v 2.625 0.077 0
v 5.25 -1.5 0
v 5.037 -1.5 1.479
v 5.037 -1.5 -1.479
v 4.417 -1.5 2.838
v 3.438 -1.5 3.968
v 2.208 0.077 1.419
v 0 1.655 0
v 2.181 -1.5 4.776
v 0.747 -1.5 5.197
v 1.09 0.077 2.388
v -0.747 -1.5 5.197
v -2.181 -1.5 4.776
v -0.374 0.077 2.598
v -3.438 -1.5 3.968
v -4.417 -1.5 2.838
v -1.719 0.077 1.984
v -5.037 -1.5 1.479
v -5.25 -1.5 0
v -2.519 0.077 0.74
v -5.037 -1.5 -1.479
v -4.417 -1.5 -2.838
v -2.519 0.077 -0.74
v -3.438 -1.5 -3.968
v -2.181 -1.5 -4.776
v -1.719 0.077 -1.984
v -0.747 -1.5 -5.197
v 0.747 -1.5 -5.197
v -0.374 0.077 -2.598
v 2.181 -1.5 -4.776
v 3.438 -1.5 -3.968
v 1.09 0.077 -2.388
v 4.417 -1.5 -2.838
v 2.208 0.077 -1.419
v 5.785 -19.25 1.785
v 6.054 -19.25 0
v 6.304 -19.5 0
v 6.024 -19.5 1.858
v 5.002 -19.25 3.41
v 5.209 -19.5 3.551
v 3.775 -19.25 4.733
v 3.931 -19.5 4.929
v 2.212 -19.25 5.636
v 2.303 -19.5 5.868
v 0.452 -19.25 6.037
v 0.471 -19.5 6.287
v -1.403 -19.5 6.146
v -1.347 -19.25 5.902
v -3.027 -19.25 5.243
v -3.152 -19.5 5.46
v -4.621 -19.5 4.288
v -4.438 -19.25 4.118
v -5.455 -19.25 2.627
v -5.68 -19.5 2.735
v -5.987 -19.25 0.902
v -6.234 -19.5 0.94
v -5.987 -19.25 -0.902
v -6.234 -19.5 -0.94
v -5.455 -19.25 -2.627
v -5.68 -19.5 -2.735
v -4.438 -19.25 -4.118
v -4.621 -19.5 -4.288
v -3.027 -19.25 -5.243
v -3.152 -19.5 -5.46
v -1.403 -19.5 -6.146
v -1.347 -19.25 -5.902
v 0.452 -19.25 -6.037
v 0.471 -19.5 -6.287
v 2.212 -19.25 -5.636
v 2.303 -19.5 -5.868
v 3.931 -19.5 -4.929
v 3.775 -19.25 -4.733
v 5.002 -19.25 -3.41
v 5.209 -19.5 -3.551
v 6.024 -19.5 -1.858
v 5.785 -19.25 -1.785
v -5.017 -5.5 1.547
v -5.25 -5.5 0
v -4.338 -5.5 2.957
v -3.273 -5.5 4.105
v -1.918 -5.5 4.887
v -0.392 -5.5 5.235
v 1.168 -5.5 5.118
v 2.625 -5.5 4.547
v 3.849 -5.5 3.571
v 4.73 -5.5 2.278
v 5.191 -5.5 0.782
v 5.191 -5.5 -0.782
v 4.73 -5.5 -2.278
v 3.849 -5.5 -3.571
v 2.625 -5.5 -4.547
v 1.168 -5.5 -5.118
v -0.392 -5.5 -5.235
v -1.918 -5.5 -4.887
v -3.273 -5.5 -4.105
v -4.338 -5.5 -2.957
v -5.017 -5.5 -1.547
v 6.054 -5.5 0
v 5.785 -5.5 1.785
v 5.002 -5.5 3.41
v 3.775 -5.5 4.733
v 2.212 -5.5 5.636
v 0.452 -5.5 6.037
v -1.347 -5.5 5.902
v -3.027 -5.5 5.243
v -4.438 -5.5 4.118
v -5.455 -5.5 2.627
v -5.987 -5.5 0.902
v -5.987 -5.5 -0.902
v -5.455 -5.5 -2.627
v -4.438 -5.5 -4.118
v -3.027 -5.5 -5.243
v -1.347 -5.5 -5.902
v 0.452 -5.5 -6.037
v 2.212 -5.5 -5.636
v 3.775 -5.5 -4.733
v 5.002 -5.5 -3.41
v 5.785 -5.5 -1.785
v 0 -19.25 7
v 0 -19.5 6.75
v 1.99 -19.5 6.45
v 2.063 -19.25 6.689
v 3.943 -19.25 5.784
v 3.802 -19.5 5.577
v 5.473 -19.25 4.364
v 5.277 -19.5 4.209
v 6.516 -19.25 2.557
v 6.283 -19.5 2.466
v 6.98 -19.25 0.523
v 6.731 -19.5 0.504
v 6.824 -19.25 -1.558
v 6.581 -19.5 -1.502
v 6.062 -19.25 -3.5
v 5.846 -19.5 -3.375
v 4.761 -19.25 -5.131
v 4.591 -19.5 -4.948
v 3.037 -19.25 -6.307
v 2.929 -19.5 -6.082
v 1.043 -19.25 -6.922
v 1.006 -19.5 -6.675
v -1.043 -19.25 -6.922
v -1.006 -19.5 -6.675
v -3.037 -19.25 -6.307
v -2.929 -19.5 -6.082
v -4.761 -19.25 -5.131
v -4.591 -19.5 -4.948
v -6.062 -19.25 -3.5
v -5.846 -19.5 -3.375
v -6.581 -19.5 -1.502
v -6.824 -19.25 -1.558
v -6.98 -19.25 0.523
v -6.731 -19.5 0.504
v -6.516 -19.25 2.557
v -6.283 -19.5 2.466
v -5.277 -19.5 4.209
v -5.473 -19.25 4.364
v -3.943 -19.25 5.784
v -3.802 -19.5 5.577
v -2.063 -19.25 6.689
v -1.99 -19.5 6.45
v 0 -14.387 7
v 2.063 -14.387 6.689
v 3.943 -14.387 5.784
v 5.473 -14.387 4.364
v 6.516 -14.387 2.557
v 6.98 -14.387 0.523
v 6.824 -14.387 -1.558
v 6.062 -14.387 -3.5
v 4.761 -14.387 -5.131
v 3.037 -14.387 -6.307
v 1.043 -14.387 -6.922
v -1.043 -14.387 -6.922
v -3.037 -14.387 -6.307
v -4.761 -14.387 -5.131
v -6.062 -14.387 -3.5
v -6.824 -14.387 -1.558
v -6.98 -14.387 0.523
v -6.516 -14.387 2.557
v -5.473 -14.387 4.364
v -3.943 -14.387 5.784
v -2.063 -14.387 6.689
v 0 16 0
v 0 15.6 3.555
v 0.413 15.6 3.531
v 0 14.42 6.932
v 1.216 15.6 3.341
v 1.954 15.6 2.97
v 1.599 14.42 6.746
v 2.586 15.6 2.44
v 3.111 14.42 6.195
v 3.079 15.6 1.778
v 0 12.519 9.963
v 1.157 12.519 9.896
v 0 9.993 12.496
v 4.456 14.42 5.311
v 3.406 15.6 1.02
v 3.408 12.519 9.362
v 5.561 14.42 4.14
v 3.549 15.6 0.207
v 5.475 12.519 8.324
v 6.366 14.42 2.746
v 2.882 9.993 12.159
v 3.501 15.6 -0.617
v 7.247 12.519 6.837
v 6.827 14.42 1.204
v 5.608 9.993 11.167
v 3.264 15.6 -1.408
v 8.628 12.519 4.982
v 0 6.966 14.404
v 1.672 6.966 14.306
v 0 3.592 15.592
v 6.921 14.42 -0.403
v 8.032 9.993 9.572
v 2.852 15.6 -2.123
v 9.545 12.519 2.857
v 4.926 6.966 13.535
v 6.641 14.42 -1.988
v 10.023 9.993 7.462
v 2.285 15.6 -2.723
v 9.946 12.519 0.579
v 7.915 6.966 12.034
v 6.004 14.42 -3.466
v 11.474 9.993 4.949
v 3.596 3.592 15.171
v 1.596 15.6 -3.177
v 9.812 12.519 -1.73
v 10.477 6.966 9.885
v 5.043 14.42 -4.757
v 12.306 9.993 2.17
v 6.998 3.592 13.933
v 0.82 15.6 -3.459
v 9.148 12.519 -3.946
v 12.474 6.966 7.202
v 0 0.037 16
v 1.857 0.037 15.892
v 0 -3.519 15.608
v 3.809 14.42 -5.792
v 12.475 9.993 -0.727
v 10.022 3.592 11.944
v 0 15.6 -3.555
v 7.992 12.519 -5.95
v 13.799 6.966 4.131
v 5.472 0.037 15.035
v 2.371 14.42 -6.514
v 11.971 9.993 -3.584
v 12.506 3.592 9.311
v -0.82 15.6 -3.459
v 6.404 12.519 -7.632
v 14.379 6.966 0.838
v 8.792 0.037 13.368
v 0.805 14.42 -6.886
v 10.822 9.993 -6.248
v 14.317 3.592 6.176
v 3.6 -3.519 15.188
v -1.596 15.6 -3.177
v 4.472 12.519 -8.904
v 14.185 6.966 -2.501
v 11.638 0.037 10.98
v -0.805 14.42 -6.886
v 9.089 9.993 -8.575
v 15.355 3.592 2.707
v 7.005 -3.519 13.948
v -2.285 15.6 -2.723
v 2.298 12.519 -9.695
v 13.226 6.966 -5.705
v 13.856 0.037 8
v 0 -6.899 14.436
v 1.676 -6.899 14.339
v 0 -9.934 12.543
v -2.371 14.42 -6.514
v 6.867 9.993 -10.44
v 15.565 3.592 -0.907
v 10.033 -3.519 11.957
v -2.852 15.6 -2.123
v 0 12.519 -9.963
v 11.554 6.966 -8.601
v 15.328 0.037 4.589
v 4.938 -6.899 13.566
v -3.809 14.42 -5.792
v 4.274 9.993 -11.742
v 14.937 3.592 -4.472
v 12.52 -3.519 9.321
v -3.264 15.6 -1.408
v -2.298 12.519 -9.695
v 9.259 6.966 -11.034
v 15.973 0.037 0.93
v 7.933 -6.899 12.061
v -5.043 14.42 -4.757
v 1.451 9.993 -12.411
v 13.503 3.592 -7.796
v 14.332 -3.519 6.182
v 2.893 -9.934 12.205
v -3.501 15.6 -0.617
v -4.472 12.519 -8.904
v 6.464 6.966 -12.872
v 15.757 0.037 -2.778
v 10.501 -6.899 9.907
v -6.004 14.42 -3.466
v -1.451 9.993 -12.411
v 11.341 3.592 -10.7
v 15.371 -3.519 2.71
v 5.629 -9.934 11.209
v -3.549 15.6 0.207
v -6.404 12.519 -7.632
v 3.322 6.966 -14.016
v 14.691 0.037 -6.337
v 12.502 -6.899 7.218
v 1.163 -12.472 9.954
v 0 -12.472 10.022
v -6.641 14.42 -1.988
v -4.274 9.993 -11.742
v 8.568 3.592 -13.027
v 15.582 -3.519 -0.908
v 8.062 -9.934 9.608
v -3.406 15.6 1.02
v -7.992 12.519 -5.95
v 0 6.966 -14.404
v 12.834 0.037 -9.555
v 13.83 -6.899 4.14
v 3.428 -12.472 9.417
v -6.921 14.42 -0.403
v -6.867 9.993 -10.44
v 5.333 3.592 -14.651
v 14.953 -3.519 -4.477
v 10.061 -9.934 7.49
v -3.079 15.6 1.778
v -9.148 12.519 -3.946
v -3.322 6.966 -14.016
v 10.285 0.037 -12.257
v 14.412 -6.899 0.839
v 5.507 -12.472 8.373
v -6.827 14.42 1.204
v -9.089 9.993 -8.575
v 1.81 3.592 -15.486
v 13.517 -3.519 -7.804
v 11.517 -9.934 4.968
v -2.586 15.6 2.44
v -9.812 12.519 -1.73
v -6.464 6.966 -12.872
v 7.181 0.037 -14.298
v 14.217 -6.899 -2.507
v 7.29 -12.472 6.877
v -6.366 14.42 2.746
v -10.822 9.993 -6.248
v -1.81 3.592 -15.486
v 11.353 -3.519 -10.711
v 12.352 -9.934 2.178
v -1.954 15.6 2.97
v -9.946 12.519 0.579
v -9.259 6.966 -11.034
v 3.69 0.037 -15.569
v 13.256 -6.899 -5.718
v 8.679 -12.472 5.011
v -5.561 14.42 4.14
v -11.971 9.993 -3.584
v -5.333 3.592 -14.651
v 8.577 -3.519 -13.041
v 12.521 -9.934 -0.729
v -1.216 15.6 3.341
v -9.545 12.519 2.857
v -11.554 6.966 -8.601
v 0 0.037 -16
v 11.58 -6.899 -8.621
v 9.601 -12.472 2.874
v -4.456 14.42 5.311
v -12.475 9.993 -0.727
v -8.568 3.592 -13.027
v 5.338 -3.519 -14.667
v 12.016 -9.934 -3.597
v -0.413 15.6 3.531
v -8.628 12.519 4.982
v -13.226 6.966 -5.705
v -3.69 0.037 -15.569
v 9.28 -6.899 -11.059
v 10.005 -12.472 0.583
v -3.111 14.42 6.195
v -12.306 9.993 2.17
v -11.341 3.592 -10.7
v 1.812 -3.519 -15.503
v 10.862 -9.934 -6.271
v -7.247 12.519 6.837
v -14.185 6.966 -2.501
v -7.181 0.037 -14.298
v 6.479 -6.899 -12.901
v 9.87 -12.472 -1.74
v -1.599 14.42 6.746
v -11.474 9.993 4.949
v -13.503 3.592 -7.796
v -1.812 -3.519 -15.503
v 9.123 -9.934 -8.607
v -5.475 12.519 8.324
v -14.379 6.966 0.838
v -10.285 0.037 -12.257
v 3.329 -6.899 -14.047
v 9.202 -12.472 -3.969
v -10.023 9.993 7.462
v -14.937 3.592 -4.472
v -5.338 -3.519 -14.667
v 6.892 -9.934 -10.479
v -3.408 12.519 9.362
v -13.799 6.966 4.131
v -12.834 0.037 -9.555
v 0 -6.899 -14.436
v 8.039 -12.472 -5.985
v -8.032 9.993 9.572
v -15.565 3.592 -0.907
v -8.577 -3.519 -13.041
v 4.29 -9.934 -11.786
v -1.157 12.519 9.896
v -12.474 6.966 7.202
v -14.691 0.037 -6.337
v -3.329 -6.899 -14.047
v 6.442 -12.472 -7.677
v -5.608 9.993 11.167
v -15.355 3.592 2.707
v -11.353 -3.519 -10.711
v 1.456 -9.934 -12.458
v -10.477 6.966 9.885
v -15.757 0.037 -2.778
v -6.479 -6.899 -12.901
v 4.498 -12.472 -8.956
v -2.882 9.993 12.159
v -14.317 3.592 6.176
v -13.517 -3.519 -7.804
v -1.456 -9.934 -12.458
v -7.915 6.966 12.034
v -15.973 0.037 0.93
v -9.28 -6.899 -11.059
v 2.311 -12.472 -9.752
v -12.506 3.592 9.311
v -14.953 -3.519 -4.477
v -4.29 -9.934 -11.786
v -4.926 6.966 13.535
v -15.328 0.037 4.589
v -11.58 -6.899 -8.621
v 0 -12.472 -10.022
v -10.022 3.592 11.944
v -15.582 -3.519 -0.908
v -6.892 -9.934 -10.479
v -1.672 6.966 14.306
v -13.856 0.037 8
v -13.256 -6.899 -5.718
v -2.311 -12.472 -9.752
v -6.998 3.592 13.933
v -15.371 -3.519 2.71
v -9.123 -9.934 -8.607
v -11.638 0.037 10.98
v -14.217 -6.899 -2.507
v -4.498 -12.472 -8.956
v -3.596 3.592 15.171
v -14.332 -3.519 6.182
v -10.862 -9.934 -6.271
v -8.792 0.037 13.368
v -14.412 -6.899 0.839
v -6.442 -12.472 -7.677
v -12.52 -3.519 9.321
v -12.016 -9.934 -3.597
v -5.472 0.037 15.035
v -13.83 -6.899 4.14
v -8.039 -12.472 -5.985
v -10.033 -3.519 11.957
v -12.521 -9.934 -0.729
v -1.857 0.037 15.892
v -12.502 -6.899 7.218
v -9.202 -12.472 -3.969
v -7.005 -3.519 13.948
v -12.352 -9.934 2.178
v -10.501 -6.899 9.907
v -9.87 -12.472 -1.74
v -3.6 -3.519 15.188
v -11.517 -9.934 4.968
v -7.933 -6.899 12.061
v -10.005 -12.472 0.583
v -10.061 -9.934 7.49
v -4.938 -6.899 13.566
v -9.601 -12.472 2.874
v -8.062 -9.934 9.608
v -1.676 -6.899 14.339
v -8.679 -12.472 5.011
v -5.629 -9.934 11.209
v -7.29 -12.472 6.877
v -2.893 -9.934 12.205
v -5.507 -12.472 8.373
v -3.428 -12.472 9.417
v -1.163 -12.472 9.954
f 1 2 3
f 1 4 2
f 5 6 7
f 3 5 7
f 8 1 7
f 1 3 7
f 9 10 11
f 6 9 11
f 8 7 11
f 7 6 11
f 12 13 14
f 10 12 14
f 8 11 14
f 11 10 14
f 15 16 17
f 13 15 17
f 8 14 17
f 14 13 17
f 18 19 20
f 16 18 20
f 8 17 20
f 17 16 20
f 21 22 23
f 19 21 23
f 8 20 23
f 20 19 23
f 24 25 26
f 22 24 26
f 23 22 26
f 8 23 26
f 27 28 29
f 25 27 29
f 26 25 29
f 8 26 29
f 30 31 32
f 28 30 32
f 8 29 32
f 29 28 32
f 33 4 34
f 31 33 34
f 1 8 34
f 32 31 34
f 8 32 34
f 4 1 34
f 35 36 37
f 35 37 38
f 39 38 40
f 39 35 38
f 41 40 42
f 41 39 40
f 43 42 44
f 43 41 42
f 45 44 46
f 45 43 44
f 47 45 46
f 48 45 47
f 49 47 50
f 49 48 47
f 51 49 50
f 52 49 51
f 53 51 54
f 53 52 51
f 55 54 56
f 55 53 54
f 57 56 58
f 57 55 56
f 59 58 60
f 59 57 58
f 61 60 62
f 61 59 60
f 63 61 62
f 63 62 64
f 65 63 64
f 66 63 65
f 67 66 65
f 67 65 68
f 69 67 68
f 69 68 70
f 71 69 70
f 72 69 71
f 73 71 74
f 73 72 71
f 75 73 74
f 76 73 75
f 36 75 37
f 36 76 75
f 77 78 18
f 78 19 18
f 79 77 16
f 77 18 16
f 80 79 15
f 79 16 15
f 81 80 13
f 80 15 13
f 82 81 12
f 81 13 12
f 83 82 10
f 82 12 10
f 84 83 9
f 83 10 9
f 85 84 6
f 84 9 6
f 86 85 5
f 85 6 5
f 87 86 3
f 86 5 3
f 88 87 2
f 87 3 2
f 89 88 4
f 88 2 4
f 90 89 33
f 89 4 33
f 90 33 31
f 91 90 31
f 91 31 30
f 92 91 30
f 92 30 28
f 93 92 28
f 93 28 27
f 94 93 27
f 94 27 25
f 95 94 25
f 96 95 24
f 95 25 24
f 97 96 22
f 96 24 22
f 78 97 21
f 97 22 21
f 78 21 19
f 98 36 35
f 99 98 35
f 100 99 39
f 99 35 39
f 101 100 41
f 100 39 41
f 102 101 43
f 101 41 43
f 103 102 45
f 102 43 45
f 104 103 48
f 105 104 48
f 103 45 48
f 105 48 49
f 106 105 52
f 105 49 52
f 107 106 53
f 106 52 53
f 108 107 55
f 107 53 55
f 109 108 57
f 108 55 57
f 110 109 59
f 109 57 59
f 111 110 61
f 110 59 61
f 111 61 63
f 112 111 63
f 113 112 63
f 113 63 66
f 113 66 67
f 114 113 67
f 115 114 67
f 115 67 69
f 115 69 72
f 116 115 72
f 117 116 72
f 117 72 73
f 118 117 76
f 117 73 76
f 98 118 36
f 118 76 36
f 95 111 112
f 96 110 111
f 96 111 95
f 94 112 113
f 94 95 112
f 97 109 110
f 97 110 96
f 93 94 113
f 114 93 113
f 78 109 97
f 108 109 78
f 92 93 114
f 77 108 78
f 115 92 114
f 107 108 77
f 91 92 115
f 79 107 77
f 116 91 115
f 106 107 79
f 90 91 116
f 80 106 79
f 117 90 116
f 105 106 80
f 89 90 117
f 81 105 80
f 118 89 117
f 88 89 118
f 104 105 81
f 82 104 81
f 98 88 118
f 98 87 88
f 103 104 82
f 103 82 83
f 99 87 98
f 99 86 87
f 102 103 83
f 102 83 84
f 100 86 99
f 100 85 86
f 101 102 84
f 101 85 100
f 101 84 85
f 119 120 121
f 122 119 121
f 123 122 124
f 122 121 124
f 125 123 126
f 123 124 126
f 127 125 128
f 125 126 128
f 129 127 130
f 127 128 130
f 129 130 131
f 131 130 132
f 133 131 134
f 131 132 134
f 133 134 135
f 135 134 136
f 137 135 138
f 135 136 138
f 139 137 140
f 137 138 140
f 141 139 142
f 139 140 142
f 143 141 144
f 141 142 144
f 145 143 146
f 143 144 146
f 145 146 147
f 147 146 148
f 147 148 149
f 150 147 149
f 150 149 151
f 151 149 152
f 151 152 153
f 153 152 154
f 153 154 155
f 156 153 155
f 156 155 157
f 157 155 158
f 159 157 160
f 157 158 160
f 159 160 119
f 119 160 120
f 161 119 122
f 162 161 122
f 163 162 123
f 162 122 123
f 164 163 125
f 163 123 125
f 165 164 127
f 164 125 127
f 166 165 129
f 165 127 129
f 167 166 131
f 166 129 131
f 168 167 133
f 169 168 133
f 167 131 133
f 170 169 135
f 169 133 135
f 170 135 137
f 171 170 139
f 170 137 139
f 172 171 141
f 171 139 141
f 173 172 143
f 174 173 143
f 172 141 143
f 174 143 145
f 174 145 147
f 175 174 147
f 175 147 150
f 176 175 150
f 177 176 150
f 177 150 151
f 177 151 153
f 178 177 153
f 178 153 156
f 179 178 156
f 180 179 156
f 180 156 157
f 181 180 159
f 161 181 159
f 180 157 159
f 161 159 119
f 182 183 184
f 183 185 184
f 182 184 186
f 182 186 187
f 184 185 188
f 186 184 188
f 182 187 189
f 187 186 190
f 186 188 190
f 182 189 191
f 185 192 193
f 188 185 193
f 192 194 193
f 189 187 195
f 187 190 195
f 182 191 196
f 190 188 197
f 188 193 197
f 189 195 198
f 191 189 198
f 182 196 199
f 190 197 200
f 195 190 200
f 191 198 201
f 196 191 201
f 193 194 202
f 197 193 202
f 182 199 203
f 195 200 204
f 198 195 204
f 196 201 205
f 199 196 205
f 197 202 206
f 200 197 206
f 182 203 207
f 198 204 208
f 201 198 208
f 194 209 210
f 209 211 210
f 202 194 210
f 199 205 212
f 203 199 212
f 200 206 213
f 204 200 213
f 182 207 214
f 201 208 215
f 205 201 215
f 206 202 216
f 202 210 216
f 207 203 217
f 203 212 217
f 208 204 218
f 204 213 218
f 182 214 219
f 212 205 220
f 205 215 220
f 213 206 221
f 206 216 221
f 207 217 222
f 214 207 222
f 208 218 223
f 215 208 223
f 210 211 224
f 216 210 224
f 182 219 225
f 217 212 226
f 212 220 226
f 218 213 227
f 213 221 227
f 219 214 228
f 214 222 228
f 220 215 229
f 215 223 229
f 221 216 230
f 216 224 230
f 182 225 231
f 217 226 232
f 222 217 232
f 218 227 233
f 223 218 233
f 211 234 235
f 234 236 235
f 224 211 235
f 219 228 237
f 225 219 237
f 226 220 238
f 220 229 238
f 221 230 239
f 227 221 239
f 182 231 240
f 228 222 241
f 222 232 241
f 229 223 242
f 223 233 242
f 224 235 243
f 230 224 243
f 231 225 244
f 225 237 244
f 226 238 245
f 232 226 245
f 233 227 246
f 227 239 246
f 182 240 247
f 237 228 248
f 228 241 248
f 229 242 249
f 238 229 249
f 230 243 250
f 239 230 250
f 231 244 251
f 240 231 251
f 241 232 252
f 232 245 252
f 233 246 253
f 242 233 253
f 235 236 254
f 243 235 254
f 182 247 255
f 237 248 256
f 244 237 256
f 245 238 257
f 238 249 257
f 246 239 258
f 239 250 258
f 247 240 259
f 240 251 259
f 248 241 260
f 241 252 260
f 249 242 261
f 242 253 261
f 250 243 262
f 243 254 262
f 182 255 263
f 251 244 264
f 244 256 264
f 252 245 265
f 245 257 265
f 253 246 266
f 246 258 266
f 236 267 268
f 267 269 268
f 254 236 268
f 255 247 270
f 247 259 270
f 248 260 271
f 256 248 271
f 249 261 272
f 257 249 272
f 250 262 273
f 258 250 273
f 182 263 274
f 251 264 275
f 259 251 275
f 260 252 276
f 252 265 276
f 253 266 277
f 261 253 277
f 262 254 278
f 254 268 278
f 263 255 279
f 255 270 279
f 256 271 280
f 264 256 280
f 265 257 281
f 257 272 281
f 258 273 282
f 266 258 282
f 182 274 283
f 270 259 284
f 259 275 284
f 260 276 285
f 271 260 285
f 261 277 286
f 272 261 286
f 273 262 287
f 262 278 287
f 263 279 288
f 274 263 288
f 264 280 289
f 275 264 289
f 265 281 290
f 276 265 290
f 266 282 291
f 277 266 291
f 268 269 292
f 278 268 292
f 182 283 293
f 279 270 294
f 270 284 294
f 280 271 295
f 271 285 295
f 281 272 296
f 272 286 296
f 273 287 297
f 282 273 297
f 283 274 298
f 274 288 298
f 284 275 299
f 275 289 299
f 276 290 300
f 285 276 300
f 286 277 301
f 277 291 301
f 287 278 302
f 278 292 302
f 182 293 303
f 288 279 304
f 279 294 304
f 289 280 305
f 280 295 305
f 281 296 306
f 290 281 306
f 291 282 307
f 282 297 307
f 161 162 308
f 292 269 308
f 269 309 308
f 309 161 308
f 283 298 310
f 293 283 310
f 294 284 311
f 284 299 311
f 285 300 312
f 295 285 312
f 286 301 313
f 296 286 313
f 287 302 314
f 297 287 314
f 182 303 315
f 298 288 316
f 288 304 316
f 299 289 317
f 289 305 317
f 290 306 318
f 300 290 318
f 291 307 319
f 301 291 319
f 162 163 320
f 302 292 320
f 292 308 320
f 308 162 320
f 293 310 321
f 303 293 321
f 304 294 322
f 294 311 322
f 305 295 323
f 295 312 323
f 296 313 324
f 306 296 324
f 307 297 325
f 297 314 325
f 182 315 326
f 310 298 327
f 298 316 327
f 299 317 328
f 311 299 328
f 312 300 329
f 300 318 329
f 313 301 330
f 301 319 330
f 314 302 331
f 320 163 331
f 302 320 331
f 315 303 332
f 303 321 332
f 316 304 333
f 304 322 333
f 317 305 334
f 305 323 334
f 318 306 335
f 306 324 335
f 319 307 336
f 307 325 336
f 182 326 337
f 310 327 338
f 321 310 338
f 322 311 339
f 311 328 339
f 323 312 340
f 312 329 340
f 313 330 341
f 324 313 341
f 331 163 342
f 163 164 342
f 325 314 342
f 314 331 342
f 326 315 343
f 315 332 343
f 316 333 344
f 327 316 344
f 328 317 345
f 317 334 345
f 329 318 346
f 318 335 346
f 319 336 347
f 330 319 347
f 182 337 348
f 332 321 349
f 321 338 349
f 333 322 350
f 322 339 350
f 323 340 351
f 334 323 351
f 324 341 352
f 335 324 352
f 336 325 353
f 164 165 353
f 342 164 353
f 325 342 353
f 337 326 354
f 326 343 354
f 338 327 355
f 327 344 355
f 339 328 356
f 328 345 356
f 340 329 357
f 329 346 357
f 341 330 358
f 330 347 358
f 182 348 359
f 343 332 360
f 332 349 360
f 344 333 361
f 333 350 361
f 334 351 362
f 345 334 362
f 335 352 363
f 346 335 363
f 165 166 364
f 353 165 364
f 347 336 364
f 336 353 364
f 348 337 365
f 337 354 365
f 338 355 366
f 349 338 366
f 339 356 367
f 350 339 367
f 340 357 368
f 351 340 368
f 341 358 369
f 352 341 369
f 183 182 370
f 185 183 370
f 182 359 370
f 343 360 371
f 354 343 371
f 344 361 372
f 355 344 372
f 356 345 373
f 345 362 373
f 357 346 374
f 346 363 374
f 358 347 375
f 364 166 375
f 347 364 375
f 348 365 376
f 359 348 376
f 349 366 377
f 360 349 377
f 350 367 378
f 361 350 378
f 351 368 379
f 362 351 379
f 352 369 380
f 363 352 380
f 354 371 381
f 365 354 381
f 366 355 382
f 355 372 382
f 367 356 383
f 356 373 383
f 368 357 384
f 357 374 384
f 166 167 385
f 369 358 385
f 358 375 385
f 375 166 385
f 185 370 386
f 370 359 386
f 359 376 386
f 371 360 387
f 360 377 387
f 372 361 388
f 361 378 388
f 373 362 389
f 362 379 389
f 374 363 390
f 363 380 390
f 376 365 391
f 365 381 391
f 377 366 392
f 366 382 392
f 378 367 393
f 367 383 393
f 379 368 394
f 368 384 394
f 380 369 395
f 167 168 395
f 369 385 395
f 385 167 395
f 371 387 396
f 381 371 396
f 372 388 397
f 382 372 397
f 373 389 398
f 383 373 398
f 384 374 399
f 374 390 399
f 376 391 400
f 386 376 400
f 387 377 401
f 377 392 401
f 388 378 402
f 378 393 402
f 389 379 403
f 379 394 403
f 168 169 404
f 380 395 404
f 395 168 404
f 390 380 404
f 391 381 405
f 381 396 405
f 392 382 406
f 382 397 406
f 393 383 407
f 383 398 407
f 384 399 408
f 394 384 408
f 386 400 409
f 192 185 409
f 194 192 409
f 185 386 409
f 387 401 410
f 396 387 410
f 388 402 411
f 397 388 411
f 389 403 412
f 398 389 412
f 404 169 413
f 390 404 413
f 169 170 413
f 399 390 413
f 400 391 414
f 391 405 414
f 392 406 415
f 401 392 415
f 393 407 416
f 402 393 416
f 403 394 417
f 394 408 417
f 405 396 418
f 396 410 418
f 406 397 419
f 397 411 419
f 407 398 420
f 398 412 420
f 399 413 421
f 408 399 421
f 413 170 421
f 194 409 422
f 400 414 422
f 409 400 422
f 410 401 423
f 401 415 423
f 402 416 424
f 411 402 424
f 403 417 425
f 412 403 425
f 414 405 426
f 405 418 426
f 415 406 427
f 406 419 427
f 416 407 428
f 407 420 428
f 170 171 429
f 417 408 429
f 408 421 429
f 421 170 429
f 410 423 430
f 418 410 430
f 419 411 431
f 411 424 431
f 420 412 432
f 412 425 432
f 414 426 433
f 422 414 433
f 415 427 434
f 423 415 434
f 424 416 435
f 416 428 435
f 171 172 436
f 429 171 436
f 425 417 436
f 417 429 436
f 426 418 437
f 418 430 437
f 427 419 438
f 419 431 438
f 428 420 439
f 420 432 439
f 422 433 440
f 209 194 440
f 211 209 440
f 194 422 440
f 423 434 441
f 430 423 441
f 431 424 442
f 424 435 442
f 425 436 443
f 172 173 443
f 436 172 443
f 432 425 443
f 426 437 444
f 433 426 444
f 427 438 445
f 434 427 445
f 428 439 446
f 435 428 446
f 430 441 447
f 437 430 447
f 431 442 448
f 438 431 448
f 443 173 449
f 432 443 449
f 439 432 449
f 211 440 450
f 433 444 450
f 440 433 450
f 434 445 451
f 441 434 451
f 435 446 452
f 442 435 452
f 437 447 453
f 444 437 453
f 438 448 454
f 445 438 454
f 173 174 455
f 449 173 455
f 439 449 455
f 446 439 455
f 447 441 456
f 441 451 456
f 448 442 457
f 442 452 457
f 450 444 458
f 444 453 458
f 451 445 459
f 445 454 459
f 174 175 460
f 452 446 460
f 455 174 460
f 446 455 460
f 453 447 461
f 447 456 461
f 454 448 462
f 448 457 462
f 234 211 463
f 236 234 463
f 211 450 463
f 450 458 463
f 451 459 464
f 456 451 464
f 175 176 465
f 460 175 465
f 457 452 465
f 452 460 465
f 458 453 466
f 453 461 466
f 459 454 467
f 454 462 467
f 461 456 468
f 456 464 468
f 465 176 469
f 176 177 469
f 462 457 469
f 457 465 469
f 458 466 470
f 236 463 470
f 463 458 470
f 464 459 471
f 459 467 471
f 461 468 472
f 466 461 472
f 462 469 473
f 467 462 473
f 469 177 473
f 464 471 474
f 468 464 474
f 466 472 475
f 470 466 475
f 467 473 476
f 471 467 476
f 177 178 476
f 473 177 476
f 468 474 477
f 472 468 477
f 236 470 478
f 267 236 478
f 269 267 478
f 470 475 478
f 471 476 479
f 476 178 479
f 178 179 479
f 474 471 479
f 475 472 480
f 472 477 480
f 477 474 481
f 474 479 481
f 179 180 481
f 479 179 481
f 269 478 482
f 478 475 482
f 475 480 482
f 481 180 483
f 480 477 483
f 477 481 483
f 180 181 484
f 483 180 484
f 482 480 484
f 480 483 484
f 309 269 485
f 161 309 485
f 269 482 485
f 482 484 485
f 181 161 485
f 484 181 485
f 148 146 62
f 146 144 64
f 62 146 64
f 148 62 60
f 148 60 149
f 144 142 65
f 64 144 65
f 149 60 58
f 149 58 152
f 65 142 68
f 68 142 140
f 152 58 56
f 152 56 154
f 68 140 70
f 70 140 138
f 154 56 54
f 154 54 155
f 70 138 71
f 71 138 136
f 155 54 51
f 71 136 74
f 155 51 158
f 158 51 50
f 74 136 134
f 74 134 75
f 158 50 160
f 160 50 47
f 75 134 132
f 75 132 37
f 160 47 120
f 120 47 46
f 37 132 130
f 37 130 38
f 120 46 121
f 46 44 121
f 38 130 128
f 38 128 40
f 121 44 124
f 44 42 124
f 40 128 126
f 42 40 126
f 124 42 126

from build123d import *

# Parameters (mm, degrees)
F3_D     = 10.5
F3_DEPTH = 18
F3_TIP   = 3.1545182499
F4_R     = 6.054221828
F5_DEPTH = 14
F6_SIZE  = 0.25


with BuildPart() as f1:
    # F0 (on Right) → F1 (revolve)
    with BuildSketch(Plane.YZ):
        with BuildLine():
            ThreePointArc((16, 0), (3.5916630466, 15.5916630466), (-14.3874945699, 7))
            Line((-14.3874945699, 7), (-16, 7))
            Line((-16, 7), (-19.5, 7))
            Line((-19.5, 7), (-19.5, 0))
            Line((-19.5, 0), (-16, 0))
            Line((-16, 0), (16, 0))
        make_face()
    revolve(axis=Axis((0, 0, 0), (0, 1, 0)))

    # F3
    with Locations(Plane.XZ.offset(19.5)):
        with Locations((0, 0)):
            Hole(F3_D / 2, depth=F3_DEPTH)
            with Locations((0, 0, -(F3_DEPTH + F3_TIP / 2))):  # 118° drill point
                Cone(0, F3_D / 2, F3_TIP, mode=Mode.SUBTRACT)

    # F4 (on face) → F5 (cut)
    with BuildSketch(Plane.XZ.offset(19.5)):
        Circle(F4_R)
    extrude(amount=-F5_DEPTH, mode=Mode.SUBTRACT)

    # F6
    f6_edges = [f1.edges().sort_by_distance(p)[0] for p in [
        (0, -19.5, -7),
        (-6.054222, -19.5, 0),
    ]]
    chamfer(f6_edges, length=F6_SIZE)


solid = f1.part
